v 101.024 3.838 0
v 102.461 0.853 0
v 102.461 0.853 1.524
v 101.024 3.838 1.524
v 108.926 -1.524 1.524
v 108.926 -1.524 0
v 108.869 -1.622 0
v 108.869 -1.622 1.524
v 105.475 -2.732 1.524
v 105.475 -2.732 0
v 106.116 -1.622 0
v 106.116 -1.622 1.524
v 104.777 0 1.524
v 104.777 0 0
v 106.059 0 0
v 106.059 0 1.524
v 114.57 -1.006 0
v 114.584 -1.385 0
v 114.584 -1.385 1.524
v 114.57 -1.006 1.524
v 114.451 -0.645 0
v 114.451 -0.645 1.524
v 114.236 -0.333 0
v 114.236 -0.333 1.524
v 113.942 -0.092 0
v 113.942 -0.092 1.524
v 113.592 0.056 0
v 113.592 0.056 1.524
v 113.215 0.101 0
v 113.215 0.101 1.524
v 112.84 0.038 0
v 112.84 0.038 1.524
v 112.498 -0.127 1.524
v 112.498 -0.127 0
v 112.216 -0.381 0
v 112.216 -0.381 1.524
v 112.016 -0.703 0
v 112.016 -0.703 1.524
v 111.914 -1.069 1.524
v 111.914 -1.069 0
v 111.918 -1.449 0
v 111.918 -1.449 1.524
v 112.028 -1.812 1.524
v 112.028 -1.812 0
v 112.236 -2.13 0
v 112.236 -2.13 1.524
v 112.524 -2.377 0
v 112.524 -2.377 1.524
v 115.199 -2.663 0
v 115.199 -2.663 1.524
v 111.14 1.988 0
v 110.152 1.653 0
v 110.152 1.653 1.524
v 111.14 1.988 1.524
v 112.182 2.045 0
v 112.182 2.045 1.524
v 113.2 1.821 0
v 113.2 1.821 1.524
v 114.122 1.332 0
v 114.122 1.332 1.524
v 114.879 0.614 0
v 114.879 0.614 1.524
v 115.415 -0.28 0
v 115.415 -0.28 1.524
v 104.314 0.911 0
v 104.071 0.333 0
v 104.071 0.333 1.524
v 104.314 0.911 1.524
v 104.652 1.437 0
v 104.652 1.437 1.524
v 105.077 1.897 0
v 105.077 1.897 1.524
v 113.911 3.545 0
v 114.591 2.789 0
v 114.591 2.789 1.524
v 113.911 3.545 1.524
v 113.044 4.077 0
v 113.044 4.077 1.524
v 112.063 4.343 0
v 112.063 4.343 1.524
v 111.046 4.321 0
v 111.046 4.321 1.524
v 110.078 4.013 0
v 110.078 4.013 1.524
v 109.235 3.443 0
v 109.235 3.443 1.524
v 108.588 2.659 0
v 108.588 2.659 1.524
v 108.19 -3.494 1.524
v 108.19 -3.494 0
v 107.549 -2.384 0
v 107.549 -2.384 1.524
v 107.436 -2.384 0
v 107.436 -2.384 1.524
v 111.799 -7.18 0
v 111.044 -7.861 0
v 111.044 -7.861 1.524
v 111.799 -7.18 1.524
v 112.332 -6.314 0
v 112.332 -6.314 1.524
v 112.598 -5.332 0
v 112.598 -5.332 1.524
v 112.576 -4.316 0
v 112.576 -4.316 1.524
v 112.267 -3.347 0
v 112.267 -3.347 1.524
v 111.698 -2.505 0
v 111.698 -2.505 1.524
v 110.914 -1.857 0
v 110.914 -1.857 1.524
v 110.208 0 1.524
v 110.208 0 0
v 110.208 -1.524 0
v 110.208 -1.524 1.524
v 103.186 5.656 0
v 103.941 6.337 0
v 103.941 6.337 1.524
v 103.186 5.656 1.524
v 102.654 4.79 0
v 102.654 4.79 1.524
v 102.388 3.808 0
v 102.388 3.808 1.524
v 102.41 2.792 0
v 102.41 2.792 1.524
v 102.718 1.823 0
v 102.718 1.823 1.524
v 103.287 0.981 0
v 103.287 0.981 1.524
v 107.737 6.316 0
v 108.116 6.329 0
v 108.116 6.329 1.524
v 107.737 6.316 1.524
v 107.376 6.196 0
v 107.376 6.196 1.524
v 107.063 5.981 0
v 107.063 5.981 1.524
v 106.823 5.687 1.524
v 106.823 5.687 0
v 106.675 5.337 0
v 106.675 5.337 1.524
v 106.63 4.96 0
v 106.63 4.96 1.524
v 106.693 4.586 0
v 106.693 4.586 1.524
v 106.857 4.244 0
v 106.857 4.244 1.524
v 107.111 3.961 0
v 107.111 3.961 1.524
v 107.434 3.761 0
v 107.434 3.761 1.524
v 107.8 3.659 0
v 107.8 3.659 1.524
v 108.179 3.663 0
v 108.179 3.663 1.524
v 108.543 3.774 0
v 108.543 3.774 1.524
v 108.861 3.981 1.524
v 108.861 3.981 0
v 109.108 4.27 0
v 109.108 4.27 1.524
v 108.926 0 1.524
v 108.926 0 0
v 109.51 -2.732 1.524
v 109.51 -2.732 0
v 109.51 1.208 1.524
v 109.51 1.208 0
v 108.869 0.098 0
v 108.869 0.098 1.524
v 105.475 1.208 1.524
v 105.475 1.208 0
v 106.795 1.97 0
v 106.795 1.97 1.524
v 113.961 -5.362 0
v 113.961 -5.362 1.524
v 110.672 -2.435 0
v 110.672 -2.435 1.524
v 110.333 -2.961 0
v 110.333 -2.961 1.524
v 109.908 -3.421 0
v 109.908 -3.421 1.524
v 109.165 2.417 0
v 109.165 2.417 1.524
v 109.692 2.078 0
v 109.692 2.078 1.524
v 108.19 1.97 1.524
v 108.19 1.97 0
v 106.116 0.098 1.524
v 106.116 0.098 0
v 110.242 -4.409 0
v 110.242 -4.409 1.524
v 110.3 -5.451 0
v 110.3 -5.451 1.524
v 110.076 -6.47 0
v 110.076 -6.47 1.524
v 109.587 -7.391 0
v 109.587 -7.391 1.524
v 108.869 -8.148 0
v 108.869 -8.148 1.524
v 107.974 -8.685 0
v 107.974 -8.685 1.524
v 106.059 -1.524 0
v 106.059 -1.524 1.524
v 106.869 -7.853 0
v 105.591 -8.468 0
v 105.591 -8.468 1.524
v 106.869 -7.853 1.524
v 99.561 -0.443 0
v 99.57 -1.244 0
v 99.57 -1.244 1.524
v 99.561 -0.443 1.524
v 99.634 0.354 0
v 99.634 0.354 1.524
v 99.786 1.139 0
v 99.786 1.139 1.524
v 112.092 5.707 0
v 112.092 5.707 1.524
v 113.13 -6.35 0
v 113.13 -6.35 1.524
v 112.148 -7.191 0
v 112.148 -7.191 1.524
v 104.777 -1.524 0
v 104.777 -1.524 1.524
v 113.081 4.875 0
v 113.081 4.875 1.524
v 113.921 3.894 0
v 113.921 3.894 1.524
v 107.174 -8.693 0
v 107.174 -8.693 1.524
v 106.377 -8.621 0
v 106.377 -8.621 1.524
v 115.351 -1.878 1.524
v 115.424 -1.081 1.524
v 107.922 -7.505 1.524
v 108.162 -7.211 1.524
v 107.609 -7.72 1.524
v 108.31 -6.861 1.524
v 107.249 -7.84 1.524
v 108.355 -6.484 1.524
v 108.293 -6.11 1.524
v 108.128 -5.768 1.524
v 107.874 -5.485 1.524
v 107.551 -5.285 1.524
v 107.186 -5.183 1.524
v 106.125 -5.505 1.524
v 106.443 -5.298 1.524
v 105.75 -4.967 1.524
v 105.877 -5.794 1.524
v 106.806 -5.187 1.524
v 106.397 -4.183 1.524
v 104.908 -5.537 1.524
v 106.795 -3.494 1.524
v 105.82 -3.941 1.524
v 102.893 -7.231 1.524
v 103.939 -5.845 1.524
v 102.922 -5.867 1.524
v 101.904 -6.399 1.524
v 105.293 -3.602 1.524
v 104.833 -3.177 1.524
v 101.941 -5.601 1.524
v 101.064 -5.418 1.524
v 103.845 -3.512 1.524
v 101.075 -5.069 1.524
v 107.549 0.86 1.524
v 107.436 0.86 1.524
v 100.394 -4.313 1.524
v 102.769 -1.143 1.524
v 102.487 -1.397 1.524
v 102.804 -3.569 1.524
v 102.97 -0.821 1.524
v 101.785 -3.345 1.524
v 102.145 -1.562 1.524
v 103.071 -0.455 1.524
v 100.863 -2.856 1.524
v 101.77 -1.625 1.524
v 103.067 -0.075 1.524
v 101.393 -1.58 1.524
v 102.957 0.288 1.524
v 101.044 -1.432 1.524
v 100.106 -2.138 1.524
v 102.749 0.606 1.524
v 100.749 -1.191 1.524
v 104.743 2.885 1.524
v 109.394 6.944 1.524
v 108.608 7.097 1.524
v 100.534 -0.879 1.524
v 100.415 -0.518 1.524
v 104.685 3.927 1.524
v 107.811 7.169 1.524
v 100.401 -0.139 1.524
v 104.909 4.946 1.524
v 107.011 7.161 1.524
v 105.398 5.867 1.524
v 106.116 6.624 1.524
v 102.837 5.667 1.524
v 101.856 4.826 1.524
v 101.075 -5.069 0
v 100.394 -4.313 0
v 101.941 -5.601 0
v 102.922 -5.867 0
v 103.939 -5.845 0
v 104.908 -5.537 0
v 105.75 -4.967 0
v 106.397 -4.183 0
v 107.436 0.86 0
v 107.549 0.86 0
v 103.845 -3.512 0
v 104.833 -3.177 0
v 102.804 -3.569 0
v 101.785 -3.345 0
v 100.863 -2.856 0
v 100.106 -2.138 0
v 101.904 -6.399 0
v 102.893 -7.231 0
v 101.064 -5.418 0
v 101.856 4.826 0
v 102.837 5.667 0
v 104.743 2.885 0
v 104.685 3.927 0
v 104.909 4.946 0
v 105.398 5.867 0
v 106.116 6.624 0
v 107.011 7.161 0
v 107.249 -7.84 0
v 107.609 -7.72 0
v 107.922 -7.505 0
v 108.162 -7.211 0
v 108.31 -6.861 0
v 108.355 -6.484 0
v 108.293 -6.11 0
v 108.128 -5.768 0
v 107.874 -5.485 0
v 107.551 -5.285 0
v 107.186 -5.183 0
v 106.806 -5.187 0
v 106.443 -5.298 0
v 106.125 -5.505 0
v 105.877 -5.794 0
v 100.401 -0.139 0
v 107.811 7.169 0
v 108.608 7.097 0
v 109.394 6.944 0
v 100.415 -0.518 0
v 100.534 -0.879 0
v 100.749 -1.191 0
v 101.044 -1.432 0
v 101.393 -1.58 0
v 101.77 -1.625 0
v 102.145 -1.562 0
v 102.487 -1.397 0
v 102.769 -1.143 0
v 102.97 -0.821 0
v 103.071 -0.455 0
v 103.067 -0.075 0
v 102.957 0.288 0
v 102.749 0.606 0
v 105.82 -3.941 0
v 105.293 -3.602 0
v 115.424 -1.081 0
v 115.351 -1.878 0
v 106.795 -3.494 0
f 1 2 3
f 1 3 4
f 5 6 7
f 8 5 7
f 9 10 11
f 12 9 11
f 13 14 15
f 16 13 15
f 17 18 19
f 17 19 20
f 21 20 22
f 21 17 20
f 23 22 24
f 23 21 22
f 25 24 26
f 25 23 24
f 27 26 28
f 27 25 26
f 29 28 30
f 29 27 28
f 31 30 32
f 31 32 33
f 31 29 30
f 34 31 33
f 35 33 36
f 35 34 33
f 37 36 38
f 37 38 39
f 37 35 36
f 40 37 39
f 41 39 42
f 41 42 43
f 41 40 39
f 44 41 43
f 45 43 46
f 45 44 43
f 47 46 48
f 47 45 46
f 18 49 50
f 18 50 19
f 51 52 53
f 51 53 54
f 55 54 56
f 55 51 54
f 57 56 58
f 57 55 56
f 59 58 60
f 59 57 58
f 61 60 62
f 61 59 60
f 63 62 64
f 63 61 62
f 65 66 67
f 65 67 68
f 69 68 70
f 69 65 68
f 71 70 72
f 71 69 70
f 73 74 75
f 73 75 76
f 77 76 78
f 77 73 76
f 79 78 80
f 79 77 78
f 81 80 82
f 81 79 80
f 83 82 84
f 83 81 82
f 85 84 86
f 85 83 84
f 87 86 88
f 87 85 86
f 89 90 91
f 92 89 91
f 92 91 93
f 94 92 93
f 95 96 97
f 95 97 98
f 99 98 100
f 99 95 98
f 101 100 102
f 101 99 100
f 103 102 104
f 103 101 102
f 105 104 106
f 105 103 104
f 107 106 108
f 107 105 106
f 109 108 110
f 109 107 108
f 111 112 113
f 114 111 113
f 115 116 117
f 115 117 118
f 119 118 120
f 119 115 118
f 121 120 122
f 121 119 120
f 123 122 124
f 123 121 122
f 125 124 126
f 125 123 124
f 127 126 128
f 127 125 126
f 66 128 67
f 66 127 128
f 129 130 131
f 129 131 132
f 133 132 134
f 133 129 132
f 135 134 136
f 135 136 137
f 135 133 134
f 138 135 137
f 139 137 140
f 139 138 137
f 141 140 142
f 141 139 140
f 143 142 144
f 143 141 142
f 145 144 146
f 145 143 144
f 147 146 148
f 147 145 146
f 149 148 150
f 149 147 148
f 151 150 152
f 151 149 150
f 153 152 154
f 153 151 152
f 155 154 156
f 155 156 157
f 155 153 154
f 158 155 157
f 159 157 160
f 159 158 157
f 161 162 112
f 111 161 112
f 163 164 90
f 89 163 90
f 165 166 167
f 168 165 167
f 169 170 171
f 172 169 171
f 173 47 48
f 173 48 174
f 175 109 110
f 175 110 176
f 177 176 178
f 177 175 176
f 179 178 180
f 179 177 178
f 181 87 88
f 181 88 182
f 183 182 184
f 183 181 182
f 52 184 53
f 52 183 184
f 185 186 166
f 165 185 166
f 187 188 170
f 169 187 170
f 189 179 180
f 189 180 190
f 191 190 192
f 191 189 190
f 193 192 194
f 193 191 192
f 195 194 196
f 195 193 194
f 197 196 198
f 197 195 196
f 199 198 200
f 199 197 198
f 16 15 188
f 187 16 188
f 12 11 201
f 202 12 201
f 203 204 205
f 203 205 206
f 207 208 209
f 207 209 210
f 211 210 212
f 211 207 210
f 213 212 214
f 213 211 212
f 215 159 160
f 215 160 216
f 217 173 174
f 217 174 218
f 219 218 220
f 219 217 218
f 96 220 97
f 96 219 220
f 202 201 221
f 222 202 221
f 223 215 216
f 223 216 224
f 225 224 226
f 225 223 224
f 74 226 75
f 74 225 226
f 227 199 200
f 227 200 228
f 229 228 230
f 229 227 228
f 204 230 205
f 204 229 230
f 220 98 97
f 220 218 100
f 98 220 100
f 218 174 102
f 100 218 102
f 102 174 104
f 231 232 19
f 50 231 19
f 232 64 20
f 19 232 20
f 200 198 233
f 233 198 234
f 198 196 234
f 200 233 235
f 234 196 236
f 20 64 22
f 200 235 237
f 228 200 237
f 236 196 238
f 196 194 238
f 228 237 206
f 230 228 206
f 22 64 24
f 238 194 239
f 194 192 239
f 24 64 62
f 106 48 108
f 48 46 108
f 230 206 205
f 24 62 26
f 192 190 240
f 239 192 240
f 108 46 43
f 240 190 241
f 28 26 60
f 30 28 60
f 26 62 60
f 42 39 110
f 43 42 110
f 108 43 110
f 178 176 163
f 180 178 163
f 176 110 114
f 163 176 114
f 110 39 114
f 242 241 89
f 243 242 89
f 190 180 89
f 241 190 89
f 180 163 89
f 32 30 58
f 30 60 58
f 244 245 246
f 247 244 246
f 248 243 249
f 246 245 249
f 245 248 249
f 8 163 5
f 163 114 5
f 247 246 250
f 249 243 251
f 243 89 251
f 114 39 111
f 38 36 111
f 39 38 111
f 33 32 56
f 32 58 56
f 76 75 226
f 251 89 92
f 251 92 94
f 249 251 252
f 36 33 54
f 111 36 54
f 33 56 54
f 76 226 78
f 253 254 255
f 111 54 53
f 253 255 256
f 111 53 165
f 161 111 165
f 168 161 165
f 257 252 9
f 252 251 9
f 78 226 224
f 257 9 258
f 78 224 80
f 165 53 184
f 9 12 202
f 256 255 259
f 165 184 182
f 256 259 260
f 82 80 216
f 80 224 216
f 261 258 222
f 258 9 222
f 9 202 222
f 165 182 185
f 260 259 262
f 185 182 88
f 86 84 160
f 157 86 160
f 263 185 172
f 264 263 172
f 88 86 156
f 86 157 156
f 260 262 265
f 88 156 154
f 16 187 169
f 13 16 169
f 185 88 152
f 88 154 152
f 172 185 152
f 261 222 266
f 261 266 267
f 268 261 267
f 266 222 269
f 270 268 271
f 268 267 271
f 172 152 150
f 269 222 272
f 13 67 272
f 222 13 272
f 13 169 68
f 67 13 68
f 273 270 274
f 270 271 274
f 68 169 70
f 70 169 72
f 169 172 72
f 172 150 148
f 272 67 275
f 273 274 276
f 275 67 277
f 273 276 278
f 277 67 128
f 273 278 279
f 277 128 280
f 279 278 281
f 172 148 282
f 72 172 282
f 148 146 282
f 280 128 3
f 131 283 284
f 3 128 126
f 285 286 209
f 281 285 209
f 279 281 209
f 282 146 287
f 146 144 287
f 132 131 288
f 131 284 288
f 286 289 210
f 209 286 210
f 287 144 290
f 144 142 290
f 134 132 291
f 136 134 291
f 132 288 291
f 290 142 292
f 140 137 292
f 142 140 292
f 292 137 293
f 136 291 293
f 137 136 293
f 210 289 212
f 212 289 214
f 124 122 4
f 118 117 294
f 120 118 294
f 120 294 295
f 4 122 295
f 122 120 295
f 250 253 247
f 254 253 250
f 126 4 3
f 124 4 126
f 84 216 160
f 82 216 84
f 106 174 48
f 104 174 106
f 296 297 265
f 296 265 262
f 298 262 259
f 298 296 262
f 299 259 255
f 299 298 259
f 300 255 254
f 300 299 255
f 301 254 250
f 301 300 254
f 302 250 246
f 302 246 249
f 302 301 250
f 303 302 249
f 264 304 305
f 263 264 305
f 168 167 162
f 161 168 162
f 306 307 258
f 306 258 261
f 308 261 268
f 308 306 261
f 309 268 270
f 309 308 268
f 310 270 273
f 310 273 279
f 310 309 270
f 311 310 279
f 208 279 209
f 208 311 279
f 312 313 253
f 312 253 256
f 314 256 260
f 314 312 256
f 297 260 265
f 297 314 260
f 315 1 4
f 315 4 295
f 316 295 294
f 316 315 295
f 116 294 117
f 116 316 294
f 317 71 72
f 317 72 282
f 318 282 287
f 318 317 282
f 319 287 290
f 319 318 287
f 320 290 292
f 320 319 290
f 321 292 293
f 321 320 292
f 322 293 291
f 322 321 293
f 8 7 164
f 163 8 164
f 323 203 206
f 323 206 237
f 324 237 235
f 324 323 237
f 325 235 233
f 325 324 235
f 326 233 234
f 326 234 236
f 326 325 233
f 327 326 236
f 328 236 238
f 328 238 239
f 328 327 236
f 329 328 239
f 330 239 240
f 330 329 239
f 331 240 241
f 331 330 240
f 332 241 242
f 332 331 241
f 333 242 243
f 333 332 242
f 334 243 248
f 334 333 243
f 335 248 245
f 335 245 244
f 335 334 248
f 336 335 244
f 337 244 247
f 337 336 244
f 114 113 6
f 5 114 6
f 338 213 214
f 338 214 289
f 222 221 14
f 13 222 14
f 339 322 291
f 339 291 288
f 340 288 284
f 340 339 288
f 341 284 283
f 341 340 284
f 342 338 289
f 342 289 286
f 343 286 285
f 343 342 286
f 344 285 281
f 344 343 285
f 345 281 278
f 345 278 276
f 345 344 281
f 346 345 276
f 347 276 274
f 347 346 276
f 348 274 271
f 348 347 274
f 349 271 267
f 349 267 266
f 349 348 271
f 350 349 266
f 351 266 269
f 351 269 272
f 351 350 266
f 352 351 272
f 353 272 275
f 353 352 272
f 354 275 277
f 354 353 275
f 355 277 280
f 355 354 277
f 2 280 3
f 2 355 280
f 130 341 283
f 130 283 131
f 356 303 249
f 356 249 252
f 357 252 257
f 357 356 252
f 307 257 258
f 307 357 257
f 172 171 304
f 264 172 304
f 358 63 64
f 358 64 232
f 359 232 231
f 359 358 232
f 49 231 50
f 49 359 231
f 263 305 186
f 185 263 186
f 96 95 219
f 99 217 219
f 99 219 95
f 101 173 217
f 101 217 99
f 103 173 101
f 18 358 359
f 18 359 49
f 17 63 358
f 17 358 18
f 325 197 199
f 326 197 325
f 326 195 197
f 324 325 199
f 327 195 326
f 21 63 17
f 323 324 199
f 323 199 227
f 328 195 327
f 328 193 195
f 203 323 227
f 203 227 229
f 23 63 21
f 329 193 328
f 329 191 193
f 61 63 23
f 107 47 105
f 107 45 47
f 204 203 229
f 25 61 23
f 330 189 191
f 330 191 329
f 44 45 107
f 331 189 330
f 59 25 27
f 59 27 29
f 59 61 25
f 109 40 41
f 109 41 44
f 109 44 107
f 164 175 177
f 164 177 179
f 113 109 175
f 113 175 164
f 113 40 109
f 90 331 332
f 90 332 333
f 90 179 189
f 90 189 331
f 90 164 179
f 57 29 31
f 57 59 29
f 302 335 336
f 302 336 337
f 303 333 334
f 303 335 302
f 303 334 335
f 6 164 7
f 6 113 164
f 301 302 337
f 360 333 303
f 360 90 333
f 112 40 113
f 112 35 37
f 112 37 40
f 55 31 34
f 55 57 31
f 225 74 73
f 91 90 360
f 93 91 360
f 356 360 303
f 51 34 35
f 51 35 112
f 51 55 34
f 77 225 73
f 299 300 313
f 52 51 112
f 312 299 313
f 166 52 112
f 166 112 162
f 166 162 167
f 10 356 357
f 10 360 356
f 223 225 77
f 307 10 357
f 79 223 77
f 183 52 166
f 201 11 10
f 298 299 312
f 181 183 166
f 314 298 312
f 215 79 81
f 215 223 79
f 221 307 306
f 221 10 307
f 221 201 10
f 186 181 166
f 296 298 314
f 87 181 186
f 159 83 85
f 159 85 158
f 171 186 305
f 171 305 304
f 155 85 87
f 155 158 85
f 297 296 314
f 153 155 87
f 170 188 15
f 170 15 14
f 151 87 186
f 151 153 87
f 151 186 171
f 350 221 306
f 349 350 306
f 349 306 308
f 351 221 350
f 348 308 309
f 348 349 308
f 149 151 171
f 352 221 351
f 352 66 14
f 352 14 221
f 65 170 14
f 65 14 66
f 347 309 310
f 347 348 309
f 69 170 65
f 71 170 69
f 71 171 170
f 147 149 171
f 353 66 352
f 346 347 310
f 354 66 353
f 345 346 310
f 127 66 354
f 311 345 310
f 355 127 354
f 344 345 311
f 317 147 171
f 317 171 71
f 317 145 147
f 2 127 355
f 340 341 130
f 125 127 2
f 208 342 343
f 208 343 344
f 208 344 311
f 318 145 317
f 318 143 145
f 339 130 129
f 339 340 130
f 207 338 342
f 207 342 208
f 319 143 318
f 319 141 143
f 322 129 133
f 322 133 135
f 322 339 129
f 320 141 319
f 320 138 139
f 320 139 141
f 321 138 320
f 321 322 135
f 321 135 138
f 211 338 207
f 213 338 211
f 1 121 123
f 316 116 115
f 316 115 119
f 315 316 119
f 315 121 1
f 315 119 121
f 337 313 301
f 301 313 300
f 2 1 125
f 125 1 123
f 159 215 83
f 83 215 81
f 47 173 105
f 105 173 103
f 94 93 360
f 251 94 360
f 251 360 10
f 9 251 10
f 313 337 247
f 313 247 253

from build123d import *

# Parameters (mm, degrees)
BOSS_EXTRUDE1_DEPTH = 1.524


with BuildPart() as part:
    # Sketch1 → Boss-Extrude1 (new body)
    with BuildSketch(Plane.XY):
        with BuildLine():
            Line((105.591414647, -8.468455362), (106.869091272, -7.853190647))
            ThreePointArc((106.869091272, -7.853190647), (108.22238434, -5.932890961), (105.877274812, -5.793555702))
            Line((105.877274812, -5.793555702), (102.892707432, -7.23077304))
            ThreePointArc((102.892707432, -7.23077304), (101.464153001, -5.925516577), (100.393881735, -4.313380846))
            ThreePointArc((100.393881735, -4.313380846), (103.431247132, -5.892390693), (106.397273409, -4.183136826))
            ThreePointArc((106.397273409, -4.183136826), (105.549139909, -3.783076692), (104.83344904, -3.177135173))
            ThreePointArc((104.83344904, -3.177135173), (101.78471521, -3.345160226), (99.56970685, -1.24355409))
            ThreePointArc((99.56970685, -1.24355409), (99.587627406, -0.043990252), (99.786130504, 1.139171219))
            Line((99.786130504, 1.139171219), (100.401395219, -0.138505406))
            ThreePointArc((100.401395219, -0.138505406), (102.321694905, -1.491798474), (102.461030165, 0.853311054))
            Line((102.461030165, 0.853311054), (101.023812827, 3.837878434))
            ThreePointArc((101.023812827, 3.837878434), (102.32906929, 5.266432866), (103.941205021, 6.336704131))
            ThreePointArc((103.941205021, 6.336704131), (102.362195173, 3.299338734), (104.07144904, 0.333312457))
            ThreePointArc((104.07144904, 0.333312457), (104.471509175, 1.181445957), (105.077450693, 1.897136826))
            ThreePointArc((105.077450693, 1.897136826), (104.90942564, 4.945870656), (107.011031776, 7.160879016))
            ThreePointArc((107.011031776, 7.160879016), (108.210595614, 7.14295846), (109.393757085, 6.944455362))
            Line((109.393757085, 6.944455362), (108.11608046, 6.329190647))
            ThreePointArc((108.11608046, 6.329190647), (106.762787392, 4.408890961), (109.10789692, 4.269555702))
            Line((109.10789692, 4.269555702), (112.092464301, 5.70677304))
            ThreePointArc((112.092464301, 5.70677304), (113.521018732, 4.401516577), (114.591289997, 2.789380846))
            ThreePointArc((114.591289997, 2.789380846), (111.5539246, 4.368390693), (108.587898324, 2.659136826))
            ThreePointArc((108.587898324, 2.659136826), (109.436031823, 2.259076692), (110.151722693, 1.653135173))
            ThreePointArc((110.151722693, 1.653135173), (113.200456523, 1.821160226), (115.415464883, -0.28044591))
            ThreePointArc((115.415464883, -0.28044591), (115.397544326, -1.480009748), (115.199041228, -2.663171219))
            Line((115.199041228, -2.663171219), (114.583776513, -1.385494594))
            ThreePointArc((114.583776513, -1.385494594), (112.663476827, -0.032201526), (112.524141568, -2.377311054))
            Line((112.524141568, -2.377311054), (113.961358906, -5.361878434))
            ThreePointArc((113.961358906, -5.361878434), (112.656102443, -6.790432866), (111.043966712, -7.860704131))
            ThreePointArc((111.043966712, -7.860704131), (112.622976559, -4.823338734), (110.913722693, -1.857312457))
            ThreePointArc((110.913722693, -1.857312457), (110.513662558, -2.705445957), (109.907721039, -3.421136826))
            ThreePointArc((109.907721039, -3.421136826), (110.075746092, -6.469870656), (107.974139956, -8.684879016))
            ThreePointArc((107.974139956, -8.684879016), (106.774576118, -8.66695846), (105.591414647, -8.468455362))
        make_face()
        Polygon((110.207675722, 0), (110.207675722, -1.524), (108.925853356, -1.524), (108.869130969, -1.622246056), (109.510042152, -2.732336789), (108.190219437, -3.494336789), (107.549308253, -2.384246056), (107.435863479, -2.384246056), (106.794952296, -3.494336789), (105.47512958, -2.732336789), (106.116040764, -1.622246056), (106.059318377, -1.524), (104.77749601, -1.524), (104.77749601, 0), (106.059318377, 0), (106.116040764, 0.098246056), (105.47512958, 1.208336789), (106.794952296, 1.970336789), (107.435863479, 0.860246056), (107.549308253, 0.860246056), (108.190219437, 1.970336789), (109.510042152, 1.208336789), (108.869130969, 0.098246056), (108.925853356, 0), align=None, mode=Mode.SUBTRACT)
    extrude(amount=BOSS_EXTRUDE1_DEPTH)


solid = part.part
